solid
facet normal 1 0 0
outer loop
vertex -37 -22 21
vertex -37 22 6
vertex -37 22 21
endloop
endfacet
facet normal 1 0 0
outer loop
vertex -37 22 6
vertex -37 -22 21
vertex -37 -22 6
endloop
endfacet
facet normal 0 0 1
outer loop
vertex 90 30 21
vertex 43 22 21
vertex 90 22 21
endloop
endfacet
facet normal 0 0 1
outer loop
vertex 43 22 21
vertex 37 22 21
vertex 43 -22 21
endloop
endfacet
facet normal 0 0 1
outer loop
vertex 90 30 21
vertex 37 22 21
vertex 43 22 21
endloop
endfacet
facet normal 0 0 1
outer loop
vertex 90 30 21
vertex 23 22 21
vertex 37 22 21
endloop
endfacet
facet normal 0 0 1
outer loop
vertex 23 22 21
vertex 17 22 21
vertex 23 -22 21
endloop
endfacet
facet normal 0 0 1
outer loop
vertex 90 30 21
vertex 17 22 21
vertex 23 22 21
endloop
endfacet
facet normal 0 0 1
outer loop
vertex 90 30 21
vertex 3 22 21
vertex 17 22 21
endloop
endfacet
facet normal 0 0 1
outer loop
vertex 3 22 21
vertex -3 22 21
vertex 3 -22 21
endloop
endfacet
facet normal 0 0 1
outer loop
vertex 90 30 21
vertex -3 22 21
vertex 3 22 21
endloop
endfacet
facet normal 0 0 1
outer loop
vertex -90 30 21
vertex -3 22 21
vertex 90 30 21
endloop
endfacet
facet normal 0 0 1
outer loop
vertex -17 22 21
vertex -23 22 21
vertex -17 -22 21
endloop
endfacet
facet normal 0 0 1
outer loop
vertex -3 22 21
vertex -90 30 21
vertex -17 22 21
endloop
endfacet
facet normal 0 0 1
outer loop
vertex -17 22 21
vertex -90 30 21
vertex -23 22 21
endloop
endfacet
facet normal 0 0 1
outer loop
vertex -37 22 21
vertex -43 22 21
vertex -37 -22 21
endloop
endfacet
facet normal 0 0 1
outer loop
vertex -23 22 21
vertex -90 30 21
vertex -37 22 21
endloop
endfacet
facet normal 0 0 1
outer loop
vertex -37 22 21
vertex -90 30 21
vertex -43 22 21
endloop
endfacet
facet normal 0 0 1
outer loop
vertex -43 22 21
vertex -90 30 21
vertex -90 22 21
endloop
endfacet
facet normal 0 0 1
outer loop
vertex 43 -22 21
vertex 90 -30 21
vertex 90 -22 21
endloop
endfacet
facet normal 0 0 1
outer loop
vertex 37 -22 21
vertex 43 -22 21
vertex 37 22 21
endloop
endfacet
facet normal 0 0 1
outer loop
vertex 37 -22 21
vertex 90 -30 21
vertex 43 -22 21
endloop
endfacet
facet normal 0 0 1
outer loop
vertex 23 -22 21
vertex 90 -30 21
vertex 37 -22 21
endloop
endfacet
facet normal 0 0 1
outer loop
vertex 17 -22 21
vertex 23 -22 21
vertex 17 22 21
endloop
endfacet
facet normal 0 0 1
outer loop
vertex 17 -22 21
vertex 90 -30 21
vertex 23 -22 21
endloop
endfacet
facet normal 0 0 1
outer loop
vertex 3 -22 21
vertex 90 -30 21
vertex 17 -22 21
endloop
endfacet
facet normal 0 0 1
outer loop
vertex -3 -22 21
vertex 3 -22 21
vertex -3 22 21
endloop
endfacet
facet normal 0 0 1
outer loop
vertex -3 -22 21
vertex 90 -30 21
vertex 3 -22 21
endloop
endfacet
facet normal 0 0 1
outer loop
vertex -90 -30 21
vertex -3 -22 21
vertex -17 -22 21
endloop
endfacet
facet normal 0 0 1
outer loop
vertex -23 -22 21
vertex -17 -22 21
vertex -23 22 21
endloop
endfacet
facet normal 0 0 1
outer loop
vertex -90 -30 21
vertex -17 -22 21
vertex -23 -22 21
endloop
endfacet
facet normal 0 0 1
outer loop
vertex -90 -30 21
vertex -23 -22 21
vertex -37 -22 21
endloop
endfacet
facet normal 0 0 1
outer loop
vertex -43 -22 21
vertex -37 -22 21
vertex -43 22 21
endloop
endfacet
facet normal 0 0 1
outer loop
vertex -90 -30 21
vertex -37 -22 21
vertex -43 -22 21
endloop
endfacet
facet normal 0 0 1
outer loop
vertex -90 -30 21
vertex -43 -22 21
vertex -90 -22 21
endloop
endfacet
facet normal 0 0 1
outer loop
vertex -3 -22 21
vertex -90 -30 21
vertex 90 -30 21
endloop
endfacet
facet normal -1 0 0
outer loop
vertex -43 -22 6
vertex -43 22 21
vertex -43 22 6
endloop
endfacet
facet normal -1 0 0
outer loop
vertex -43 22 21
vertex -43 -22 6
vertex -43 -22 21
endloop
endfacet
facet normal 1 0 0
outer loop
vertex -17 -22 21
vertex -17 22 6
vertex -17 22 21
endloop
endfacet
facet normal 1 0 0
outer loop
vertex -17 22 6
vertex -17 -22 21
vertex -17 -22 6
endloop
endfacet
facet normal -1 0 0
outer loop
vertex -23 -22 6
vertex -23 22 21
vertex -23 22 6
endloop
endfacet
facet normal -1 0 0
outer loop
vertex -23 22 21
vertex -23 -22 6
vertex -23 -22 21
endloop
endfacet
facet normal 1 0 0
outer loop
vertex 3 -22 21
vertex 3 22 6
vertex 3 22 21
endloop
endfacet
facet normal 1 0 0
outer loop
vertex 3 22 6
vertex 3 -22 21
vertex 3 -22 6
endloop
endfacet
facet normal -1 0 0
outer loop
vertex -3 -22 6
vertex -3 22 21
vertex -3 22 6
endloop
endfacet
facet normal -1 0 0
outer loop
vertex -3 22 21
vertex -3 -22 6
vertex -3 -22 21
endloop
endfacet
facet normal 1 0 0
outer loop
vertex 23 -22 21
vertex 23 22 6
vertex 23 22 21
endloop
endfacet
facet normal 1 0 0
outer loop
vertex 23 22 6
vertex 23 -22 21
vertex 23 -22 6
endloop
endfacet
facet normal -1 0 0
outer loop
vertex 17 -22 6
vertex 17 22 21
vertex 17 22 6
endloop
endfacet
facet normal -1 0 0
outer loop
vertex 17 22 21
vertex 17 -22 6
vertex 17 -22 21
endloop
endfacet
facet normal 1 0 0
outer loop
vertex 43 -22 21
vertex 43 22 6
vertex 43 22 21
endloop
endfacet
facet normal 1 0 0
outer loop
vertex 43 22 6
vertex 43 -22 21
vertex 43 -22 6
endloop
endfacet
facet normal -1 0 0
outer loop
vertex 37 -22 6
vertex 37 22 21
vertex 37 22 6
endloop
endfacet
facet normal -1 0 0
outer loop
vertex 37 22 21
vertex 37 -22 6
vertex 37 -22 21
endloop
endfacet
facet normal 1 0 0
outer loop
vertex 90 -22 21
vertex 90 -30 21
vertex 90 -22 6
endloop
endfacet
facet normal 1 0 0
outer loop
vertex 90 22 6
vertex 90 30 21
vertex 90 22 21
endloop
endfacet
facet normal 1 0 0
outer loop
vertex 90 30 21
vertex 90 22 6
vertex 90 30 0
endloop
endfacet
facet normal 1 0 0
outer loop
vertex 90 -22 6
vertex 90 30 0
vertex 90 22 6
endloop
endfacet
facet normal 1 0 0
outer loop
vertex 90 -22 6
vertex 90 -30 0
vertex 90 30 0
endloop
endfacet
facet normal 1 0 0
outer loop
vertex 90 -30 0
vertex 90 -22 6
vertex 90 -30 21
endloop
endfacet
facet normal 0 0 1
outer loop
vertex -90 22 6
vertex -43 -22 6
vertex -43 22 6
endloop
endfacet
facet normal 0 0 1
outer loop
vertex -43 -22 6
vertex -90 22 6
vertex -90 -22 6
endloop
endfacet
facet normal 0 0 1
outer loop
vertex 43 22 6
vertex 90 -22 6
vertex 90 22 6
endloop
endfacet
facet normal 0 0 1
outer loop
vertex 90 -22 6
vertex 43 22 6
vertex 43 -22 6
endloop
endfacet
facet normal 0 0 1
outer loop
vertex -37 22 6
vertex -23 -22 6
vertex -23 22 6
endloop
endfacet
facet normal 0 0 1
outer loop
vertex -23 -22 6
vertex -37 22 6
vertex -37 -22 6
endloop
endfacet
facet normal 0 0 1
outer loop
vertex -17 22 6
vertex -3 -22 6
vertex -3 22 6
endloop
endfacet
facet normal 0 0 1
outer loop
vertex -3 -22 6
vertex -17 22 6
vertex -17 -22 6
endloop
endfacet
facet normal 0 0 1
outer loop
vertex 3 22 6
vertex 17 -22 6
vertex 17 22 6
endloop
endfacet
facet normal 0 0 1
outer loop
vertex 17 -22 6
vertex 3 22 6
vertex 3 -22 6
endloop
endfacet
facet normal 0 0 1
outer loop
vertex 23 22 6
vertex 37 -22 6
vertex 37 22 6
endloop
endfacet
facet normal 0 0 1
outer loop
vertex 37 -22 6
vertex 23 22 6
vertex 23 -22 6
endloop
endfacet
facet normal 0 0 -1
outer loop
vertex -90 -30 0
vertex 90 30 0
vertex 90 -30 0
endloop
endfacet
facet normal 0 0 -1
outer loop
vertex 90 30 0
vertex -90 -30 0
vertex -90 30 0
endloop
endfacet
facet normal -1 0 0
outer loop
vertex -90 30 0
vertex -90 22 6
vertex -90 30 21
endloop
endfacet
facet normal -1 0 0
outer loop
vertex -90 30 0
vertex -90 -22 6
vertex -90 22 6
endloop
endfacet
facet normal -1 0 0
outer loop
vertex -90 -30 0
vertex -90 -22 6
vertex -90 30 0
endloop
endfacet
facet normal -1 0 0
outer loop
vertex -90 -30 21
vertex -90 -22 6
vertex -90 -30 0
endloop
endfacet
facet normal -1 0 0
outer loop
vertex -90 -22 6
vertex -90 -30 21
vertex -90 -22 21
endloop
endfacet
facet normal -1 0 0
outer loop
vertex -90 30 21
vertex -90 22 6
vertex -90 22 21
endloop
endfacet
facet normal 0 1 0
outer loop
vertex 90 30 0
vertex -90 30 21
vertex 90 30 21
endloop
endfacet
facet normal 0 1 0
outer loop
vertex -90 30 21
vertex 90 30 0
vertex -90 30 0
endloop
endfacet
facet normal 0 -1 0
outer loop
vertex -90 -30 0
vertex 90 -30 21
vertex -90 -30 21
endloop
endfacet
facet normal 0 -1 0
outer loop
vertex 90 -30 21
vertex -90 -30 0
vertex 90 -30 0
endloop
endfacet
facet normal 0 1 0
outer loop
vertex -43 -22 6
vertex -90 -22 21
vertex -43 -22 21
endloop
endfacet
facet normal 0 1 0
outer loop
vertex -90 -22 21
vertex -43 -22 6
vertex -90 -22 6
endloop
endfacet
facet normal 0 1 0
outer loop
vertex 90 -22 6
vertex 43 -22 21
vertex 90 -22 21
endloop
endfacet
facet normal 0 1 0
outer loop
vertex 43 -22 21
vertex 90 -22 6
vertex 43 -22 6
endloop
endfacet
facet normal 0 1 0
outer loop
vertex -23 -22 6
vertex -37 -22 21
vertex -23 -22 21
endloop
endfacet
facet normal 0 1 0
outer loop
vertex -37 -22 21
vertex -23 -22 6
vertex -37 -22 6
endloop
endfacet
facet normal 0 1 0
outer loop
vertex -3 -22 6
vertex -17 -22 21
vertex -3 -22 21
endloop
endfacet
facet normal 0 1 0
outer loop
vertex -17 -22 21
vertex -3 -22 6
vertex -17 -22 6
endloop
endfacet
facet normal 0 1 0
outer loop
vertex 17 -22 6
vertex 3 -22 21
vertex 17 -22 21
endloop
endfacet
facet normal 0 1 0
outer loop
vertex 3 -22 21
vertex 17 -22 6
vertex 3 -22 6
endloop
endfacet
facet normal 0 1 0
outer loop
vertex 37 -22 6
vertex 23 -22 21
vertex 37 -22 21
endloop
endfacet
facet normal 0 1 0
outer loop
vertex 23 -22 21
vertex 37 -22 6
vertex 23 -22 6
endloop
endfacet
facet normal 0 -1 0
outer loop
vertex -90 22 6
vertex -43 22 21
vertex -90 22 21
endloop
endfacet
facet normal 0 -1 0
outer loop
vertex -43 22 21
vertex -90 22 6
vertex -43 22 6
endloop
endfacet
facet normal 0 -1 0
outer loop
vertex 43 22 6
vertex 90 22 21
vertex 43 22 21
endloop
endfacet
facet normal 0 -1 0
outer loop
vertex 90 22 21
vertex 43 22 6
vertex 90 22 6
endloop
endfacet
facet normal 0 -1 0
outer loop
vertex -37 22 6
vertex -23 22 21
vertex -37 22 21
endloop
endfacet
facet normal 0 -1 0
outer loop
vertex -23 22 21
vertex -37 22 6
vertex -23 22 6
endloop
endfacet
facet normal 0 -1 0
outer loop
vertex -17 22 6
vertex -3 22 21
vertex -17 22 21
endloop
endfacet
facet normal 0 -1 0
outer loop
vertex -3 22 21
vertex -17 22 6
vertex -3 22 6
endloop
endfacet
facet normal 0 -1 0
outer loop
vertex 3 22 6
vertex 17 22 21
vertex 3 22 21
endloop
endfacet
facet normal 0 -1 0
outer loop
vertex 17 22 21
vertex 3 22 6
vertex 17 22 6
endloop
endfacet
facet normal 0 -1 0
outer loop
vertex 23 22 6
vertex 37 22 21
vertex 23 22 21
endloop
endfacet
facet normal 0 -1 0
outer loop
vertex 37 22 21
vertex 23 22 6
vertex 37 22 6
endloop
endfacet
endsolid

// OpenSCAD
$fn = 32;

// ----------------------------------------------------------------------
// Rib frame 180 x 60 x 21
// 5 ribs at 20 mm pitch
// ----------------------------------------------------------------------

// --- parameters (mm) ---
frame = [180, 60, 6];  // base plate size (x, y, z)
rail_w = 8;            // side rail width
ribs = 5;              // number of ribs
rib_t = 6;             // rib thickness
rib_h = 15;            // rib height above the base plate
pitch = 20;            // pitch between rib centres

// --- derived feature positions (mm) ---
span = (ribs - 1) * pitch;          // = 80   distance between the outer ribs
origin_x = -span / 2;               // = -40   X of the first rib
rib_len = frame[1] - 2 * rail_w + 2;  // = 46   rib length, 1 mm into each rail
feature_centers = [
  [origin_x + 0 * pitch, 0],
  [origin_x + 1 * pitch, 0],
  [origin_x + 2 * pitch, 0],
  [origin_x + 3 * pitch, 0],
  [origin_x + 4 * pitch, 0]
];   // rib centre line, drives the rib loop

// base plate, two side rails, then the ribs read straight off feature_centers
union() {
  translate([-frame[0] / 2, -frame[1] / 2, 0]) cube(frame);
  translate([-frame[0] / 2, -frame[1] / 2, 0]) cube([frame[0], rail_w, frame[2] + rib_h]);
  translate([-frame[0] / 2, frame[1] / 2 - rail_w, 0]) cube([frame[0], rail_w, frame[2] + rib_h]);
  for (centre = feature_centers)
    translate([centre[0] - rib_t / 2, centre[1] - rib_len / 2, frame[2] - 1])
      cube([rib_t, rib_len, rib_h + 1]);
}
